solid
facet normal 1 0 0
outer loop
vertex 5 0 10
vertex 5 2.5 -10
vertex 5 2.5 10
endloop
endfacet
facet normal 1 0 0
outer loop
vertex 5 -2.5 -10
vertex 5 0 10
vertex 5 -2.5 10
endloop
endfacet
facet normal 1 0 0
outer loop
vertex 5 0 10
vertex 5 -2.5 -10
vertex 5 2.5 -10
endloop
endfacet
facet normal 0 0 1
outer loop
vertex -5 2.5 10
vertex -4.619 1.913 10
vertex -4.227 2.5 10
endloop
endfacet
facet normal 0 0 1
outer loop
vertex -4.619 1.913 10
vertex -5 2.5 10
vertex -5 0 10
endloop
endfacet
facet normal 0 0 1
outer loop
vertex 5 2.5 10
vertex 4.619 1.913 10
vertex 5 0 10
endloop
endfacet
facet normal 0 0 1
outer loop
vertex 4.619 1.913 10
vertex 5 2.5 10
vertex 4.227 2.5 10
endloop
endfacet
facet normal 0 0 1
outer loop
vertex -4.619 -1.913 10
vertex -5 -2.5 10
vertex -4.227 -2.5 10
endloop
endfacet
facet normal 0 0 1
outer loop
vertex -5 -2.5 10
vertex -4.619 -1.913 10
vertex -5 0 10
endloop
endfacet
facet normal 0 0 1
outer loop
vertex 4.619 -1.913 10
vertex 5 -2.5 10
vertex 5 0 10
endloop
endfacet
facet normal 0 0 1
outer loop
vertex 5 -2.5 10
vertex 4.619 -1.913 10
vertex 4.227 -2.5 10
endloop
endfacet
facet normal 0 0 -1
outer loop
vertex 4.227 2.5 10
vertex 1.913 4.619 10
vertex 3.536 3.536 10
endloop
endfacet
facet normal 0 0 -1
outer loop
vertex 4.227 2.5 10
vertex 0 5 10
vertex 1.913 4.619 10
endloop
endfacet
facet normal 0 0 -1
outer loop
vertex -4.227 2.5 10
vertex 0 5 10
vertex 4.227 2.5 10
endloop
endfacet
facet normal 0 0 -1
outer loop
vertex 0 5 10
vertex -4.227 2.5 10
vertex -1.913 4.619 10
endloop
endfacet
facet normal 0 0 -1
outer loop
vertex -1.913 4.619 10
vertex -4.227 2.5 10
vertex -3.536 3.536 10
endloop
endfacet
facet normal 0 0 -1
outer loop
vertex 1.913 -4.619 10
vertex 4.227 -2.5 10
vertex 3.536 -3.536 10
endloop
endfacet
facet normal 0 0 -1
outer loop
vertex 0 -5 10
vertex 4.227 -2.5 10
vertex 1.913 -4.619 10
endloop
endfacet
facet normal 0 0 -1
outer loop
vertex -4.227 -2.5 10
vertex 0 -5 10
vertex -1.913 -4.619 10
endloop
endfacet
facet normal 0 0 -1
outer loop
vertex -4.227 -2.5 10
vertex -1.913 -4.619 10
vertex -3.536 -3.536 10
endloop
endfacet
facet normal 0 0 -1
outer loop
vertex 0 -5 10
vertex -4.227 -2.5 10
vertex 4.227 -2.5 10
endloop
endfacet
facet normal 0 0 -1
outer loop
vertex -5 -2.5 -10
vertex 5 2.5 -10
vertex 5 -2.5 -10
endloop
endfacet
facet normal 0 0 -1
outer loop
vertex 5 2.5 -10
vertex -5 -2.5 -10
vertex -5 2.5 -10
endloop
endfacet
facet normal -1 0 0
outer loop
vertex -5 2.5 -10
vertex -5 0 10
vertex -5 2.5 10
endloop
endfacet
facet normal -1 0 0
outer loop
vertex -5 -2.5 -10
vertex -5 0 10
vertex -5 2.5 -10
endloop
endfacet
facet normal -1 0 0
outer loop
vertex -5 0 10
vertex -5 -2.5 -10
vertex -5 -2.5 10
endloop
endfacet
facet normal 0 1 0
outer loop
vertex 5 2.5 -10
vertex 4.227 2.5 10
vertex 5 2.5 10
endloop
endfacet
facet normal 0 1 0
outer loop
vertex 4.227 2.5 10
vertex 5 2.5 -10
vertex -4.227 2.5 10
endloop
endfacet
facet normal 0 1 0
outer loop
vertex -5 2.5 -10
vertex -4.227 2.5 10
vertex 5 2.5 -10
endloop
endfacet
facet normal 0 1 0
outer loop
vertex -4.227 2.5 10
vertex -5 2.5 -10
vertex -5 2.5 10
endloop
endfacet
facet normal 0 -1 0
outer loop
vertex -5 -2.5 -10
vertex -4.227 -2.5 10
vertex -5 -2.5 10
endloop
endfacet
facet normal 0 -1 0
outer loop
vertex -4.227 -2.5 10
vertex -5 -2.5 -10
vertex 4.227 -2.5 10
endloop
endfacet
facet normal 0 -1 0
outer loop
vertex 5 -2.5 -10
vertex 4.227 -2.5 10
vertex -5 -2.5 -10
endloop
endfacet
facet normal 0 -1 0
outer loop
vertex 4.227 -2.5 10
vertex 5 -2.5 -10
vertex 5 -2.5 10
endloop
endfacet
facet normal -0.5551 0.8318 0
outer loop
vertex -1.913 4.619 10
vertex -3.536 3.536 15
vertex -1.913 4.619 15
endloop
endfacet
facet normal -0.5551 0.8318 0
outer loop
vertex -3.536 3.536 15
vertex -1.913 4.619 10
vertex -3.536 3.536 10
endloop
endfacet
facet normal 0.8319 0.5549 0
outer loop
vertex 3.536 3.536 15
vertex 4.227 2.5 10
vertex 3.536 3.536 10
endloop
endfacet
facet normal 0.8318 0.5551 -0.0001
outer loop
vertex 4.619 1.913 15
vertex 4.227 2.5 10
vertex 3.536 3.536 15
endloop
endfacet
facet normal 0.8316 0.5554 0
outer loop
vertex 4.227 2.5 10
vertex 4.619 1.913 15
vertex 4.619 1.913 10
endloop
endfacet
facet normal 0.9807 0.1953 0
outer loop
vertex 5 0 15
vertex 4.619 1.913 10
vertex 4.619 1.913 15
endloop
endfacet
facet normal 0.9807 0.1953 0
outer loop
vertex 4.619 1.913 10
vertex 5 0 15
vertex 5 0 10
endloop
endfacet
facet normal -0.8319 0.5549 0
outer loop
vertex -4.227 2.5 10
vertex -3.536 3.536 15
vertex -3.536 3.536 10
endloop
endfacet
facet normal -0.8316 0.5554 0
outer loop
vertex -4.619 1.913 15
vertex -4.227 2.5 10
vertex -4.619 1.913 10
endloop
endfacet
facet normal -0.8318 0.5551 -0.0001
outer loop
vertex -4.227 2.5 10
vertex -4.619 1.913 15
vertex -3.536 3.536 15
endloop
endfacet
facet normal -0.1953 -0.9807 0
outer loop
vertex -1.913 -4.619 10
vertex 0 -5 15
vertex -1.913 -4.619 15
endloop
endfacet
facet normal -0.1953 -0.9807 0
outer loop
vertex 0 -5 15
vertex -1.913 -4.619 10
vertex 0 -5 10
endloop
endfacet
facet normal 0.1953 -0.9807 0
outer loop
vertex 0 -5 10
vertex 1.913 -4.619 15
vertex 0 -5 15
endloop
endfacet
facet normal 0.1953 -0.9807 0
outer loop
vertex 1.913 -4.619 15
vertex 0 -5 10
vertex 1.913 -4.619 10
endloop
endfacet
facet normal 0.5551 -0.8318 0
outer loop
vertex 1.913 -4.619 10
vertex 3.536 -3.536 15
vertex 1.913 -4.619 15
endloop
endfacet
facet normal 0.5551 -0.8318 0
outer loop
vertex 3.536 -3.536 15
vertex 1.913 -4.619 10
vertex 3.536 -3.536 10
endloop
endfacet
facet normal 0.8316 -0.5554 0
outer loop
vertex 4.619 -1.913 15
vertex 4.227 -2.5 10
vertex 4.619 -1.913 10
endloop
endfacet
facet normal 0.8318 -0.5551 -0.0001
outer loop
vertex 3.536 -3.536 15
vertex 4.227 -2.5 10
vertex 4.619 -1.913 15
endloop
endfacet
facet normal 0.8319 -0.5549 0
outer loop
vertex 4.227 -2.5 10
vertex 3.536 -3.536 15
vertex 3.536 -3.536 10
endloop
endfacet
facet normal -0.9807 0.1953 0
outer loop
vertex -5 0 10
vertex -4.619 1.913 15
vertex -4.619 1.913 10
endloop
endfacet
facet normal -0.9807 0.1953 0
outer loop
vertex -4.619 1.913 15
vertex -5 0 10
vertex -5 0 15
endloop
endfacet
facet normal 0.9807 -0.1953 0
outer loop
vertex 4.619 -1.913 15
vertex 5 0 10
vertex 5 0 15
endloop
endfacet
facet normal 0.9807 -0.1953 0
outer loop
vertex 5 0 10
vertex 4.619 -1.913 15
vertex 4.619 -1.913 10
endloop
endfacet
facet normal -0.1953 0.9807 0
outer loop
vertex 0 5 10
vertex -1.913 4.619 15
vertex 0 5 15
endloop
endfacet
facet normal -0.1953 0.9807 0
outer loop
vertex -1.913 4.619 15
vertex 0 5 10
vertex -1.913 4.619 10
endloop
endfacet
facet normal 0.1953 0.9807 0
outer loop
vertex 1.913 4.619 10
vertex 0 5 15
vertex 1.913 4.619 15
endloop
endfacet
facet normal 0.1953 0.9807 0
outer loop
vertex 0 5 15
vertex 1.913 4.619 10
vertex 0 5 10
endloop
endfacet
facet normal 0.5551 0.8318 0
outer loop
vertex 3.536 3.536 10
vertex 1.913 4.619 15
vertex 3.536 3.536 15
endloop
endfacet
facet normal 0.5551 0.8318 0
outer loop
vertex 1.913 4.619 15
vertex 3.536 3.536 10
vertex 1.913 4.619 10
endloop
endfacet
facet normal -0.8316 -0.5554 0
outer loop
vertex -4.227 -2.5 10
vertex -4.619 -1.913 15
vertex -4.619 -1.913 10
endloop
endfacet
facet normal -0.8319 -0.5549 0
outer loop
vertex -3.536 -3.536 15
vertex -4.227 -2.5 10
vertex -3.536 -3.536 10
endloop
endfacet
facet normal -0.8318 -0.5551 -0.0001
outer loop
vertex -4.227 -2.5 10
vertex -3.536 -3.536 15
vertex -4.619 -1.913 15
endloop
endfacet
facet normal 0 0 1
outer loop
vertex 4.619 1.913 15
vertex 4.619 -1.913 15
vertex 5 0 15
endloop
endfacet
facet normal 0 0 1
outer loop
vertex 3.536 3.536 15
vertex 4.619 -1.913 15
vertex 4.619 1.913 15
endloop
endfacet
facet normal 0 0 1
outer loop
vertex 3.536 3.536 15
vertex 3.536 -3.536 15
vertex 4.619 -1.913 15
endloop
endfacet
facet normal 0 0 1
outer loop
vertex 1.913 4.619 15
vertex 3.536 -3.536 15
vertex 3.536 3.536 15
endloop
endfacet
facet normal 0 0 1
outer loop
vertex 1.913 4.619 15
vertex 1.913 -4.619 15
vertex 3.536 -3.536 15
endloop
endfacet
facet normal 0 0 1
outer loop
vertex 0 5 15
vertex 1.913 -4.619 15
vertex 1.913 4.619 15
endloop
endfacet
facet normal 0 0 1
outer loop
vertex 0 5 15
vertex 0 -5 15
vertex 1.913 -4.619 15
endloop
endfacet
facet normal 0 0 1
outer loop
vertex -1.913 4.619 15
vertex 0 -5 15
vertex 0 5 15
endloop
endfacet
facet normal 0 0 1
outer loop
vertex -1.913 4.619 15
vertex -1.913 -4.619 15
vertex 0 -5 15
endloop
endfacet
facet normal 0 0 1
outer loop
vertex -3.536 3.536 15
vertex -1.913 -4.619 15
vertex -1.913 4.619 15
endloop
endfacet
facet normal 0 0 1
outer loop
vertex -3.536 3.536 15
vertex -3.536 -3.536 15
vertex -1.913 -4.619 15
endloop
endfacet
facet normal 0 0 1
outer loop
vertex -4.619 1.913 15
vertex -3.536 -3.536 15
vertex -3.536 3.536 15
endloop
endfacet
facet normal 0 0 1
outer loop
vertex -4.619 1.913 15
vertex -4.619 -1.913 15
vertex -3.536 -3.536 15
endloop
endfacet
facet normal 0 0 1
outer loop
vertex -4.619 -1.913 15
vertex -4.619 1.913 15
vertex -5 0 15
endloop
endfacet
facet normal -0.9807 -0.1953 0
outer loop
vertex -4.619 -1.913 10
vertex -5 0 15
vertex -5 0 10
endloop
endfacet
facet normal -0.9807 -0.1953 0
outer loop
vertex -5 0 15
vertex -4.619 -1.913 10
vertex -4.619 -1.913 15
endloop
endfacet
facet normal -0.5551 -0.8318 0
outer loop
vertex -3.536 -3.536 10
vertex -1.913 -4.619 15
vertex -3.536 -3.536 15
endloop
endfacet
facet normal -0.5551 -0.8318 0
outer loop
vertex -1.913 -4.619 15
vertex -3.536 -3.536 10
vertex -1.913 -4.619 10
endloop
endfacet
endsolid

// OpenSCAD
// cube width
width = 10;
// cube height
height = 20;
union(){
    cube([width,width / 2,height],center = true);
    translate([0,0,height / 2]){
        cylinder(width / 2, r = 5);
    }
}
